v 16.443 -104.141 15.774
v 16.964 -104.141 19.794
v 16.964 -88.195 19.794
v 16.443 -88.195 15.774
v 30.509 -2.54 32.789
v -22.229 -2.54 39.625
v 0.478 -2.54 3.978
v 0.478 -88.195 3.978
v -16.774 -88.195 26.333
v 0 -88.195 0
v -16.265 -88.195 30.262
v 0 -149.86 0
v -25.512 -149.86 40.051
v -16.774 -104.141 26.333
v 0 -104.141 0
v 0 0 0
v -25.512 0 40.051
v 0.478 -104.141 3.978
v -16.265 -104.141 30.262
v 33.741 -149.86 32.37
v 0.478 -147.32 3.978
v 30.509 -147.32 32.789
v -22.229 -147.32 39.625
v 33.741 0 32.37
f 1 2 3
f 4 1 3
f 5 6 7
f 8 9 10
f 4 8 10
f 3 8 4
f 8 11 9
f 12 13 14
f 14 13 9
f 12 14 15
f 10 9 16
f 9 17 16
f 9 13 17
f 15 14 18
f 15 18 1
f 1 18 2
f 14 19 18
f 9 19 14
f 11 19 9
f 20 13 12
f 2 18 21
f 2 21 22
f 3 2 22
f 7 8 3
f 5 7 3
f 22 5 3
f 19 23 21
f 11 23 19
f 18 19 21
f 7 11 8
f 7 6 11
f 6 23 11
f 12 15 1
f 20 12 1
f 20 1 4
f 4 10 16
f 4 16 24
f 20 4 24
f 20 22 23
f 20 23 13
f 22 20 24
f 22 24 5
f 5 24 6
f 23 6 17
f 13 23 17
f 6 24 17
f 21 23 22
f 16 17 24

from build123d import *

# Parameters (mm, degrees)
F1_DEPTH = 149.86
F3_T     = -2.54
F2_W     = 34.298644
F2_H     = 15.946299
F4_DEPTH = 94.234


with BuildPart() as f1:
    # F0 (on Front) → F1 (new body)
    with BuildSketch(Plane.XZ):
        Polygon((-25.51176, 40.050719), (0, 0), (33.741359, 32.369759), align=None)
    extrude(amount=F1_DEPTH)

    # F3
    f3_openings = [f1.faces().sort_by_distance(p)[0] for p in [
        (4.114799, -74.93, 36.210239),
    ]]
    offset(amount=F3_T, openings=f3_openings)

    # F2 (on face) → F4 (cut)
    with BuildSketch(Plane(origin=(4.684349, 0, 36.136408), x_dir=(0.991703, 0, -0.128554), z_dir=(0.128554, 0, 0.991703))):
        with Locations((-2.870781, -96.167914)):
            Rectangle(F2_W, F2_H)
    extrude(amount=-F4_DEPTH, mode=Mode.SUBTRACT)


solid = f1.part
